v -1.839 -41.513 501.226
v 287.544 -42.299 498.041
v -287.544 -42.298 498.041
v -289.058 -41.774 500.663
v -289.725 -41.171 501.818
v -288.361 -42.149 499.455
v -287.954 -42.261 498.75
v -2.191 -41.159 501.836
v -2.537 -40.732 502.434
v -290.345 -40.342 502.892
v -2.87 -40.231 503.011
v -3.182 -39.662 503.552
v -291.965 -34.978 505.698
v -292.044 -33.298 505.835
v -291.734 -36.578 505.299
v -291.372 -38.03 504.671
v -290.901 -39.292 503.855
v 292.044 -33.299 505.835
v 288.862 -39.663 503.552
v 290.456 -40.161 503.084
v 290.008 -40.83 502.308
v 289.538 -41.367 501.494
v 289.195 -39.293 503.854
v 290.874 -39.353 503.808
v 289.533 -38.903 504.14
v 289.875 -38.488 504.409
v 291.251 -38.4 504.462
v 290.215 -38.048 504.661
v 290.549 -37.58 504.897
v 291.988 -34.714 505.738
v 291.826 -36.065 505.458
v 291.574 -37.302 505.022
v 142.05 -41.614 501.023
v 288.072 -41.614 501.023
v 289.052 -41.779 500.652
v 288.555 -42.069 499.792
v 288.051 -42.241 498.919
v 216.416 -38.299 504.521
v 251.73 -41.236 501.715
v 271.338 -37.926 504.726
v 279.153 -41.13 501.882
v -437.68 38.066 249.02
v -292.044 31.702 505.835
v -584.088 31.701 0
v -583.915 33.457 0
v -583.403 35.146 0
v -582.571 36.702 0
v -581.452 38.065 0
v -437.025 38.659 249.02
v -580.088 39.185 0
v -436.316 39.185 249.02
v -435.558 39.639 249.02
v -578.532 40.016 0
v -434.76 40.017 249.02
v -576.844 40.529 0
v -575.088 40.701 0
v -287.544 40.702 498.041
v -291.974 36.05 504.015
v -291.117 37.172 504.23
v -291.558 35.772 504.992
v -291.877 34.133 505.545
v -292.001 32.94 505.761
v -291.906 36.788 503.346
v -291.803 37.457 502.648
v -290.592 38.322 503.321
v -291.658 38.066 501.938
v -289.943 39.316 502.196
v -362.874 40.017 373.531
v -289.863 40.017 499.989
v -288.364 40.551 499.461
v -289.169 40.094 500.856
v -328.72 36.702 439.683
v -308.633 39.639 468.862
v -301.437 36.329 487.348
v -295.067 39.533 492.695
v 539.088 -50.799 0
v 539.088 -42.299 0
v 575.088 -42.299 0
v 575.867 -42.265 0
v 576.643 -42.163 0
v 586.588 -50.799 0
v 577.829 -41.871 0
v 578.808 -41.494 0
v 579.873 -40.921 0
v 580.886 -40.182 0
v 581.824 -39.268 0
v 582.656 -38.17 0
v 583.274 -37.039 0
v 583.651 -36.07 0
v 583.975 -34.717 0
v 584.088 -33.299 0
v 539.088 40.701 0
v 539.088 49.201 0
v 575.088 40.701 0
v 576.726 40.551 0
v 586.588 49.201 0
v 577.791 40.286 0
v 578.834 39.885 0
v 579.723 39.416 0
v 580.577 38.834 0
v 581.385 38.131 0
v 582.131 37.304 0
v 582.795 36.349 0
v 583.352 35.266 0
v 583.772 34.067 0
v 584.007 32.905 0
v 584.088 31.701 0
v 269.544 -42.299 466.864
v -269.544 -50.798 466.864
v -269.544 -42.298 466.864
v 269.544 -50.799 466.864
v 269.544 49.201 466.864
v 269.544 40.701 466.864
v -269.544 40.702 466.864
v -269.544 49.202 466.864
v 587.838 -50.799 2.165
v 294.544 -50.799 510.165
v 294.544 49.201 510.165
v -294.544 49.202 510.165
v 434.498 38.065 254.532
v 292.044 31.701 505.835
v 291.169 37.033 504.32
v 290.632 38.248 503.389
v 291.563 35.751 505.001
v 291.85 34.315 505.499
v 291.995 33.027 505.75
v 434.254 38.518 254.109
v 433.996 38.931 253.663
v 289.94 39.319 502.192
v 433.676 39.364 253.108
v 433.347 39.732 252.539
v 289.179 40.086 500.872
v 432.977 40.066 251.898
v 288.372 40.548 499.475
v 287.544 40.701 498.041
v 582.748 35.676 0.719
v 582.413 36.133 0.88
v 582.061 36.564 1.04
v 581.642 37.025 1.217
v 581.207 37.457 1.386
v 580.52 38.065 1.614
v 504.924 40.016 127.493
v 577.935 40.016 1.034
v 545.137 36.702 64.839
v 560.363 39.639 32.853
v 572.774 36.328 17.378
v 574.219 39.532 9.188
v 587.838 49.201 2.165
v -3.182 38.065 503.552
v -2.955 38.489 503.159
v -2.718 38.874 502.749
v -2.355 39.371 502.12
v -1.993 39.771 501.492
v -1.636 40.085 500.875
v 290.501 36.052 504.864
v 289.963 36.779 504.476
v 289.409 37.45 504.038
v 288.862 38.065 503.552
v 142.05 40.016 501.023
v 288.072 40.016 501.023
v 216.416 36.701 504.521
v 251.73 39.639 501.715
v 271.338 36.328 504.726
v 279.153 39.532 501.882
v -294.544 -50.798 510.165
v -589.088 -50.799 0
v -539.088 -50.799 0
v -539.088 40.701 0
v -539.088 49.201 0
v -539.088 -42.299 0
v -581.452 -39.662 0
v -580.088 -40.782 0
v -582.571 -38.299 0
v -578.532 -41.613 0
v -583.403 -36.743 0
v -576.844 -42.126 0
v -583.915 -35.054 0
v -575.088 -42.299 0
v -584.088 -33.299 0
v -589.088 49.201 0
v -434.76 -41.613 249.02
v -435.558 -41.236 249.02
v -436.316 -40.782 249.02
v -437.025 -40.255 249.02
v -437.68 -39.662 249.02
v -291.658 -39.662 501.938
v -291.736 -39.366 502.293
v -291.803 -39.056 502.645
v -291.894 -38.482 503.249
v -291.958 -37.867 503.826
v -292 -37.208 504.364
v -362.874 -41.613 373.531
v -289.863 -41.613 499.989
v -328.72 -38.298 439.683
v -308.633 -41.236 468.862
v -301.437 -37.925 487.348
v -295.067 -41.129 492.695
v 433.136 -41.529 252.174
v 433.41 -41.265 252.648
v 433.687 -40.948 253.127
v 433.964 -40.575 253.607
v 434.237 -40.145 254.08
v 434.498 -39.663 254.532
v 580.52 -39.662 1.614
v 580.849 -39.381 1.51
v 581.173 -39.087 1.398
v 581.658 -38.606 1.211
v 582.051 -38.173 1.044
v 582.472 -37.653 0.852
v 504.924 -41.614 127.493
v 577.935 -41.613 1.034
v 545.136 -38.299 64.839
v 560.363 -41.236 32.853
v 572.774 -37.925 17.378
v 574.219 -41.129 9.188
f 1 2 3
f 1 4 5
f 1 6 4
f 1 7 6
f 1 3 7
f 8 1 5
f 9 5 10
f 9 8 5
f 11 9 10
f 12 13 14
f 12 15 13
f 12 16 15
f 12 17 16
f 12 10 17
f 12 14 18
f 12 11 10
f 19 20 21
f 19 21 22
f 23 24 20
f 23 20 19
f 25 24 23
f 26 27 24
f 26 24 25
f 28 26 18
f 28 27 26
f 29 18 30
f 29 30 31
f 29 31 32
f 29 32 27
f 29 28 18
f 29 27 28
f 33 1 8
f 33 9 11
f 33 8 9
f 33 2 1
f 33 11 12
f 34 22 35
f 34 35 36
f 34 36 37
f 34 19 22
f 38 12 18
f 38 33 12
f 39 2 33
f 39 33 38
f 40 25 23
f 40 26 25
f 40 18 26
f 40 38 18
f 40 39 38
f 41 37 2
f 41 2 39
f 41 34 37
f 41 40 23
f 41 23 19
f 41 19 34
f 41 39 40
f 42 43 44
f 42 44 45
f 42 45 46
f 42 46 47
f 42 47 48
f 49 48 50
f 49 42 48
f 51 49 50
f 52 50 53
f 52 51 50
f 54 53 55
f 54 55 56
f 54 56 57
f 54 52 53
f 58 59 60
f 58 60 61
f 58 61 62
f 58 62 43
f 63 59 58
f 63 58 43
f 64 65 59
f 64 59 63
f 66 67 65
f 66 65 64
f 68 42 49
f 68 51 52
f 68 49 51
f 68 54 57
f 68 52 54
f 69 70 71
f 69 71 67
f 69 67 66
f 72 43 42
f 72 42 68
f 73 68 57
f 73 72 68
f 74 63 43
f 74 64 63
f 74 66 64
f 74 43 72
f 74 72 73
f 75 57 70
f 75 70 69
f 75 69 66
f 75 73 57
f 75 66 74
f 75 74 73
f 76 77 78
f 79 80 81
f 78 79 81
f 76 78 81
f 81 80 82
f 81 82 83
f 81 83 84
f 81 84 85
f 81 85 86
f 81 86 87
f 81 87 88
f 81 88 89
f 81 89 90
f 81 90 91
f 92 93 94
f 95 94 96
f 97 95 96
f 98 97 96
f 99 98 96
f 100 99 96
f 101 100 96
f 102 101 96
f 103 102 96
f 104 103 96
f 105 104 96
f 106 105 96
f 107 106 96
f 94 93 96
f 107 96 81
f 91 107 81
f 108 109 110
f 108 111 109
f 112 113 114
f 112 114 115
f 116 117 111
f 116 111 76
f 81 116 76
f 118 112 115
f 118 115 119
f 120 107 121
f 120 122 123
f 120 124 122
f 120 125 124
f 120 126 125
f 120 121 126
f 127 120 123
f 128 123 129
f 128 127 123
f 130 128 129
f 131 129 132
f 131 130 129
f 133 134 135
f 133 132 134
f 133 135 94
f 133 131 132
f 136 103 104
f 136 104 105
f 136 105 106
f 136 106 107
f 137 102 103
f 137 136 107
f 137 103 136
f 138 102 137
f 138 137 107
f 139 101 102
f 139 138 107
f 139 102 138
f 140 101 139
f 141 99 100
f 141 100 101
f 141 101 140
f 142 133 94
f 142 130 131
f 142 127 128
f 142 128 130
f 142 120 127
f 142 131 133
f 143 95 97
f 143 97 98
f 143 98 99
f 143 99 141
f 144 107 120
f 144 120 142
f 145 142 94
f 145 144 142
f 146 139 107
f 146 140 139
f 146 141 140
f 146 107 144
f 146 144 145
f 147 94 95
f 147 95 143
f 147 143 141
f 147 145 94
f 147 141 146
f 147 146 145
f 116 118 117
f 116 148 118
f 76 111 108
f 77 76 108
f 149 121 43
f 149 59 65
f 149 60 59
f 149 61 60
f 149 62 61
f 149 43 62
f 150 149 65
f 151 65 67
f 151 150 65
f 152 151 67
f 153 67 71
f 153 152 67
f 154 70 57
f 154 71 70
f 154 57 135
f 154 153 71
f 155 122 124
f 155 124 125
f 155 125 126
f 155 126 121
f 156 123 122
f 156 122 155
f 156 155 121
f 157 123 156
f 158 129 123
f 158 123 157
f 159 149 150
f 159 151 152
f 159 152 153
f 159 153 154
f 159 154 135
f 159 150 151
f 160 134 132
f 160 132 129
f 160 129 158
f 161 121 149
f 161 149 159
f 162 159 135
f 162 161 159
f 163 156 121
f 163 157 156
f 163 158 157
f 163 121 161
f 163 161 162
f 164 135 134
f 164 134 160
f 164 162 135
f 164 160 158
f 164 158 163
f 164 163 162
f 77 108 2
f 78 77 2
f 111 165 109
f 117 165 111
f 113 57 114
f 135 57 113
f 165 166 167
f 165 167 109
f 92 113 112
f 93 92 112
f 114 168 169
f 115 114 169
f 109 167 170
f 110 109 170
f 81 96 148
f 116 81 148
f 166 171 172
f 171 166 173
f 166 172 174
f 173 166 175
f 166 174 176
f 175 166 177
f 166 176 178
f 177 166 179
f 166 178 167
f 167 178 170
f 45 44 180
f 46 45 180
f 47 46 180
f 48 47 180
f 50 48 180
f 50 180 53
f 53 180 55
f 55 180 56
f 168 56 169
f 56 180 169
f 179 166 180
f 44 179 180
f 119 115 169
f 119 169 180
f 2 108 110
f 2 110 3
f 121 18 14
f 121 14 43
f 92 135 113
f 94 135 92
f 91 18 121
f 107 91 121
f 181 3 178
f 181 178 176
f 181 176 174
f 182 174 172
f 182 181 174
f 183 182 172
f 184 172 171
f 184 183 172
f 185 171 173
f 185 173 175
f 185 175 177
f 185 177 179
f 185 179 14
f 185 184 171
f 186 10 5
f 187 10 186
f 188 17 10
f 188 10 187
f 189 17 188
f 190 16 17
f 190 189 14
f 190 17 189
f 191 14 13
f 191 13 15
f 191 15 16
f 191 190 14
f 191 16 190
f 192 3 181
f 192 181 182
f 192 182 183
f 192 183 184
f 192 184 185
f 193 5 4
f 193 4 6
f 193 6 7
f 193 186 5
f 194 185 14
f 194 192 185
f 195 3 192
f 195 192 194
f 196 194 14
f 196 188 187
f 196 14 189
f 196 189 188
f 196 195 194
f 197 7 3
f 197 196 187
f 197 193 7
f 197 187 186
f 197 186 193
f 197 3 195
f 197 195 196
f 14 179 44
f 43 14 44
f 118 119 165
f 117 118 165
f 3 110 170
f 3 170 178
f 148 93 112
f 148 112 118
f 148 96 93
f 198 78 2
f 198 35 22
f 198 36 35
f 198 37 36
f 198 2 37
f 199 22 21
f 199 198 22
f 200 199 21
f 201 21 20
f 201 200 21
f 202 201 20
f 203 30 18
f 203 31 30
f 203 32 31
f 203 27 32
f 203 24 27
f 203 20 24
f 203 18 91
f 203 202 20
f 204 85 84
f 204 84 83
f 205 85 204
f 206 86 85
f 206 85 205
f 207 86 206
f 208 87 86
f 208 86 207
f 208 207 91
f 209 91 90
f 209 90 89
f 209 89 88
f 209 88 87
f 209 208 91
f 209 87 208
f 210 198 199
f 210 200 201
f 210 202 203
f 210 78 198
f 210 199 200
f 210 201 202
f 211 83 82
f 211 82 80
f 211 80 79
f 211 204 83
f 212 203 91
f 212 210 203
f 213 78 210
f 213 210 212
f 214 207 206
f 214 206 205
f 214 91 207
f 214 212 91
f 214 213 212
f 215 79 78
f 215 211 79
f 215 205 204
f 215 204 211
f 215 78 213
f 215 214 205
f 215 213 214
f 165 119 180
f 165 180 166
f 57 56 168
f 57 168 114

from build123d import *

# Parameters (mm, degrees)
SKETCH2_W          = 3101.423278338
SKETCH2_H          = 415.694779912
CUT_EXTRUDE1_DEPTH = 42.13622064


with BuildPart() as part:
    # Sweep1: sweep along a curve in space
    with BuildLine() as sweep1_path:
        Line((-586.587873497, 0, 0), (-293.293936748, 0.000279204, 508))
        Line((-293.293936748, 0.000279204, 508), (293.293936748, -0.000279204, 508))
        Line((293.293936748, -0.000279204, 508), (586.587873497, 0, 0))
    # Sketch1 → Sweep1 (sweep)
    with BuildSketch(Plane.XY):
        with BuildLine():
            Line((-539.087873497, 49.201467287), (-589.087873497, 49.201467287))
            Line((-589.087873497, 49.201467287), (-589.087873497, -50.798532713))
            Line((-589.087873497, -50.798532713), (-539.087873497, -50.798532713))
            Line((-539.087873497, -50.798532713), (-539.087873497, -42.298532713))
            Line((-539.087873497, -42.298532713), (-575.087873497, -42.298532713))
            ThreePointArc((-575.087873497, -42.298532713), (-581.451834528, -39.662493744), (-584.087873497, -33.298532713))
            Line((-584.087873497, -33.298532713), (-584.087873497, 31.701467287))
            ThreePointArc((-584.087873497, 31.701467287), (-581.451834528, 38.065428317), (-575.087873497, 40.701467287))
            Line((-575.087873497, 40.701467287), (-539.087873497, 40.701467287))
            Line((-539.087873497, 40.701467287), (-539.087873497, 49.201467287))
        make_face()
    sweep(path=sweep1_path.line, transition=Transition.RIGHT)

    # Sketch2 → Cut-Extrude1 (cut, through all)
    with BuildSketch(Plane.XY):
        Rectangle(SKETCH2_W, SKETCH2_H)
    extrude(amount=-CUT_EXTRUDE1_DEPTH, mode=Mode.SUBTRACT)


solid = part.part
